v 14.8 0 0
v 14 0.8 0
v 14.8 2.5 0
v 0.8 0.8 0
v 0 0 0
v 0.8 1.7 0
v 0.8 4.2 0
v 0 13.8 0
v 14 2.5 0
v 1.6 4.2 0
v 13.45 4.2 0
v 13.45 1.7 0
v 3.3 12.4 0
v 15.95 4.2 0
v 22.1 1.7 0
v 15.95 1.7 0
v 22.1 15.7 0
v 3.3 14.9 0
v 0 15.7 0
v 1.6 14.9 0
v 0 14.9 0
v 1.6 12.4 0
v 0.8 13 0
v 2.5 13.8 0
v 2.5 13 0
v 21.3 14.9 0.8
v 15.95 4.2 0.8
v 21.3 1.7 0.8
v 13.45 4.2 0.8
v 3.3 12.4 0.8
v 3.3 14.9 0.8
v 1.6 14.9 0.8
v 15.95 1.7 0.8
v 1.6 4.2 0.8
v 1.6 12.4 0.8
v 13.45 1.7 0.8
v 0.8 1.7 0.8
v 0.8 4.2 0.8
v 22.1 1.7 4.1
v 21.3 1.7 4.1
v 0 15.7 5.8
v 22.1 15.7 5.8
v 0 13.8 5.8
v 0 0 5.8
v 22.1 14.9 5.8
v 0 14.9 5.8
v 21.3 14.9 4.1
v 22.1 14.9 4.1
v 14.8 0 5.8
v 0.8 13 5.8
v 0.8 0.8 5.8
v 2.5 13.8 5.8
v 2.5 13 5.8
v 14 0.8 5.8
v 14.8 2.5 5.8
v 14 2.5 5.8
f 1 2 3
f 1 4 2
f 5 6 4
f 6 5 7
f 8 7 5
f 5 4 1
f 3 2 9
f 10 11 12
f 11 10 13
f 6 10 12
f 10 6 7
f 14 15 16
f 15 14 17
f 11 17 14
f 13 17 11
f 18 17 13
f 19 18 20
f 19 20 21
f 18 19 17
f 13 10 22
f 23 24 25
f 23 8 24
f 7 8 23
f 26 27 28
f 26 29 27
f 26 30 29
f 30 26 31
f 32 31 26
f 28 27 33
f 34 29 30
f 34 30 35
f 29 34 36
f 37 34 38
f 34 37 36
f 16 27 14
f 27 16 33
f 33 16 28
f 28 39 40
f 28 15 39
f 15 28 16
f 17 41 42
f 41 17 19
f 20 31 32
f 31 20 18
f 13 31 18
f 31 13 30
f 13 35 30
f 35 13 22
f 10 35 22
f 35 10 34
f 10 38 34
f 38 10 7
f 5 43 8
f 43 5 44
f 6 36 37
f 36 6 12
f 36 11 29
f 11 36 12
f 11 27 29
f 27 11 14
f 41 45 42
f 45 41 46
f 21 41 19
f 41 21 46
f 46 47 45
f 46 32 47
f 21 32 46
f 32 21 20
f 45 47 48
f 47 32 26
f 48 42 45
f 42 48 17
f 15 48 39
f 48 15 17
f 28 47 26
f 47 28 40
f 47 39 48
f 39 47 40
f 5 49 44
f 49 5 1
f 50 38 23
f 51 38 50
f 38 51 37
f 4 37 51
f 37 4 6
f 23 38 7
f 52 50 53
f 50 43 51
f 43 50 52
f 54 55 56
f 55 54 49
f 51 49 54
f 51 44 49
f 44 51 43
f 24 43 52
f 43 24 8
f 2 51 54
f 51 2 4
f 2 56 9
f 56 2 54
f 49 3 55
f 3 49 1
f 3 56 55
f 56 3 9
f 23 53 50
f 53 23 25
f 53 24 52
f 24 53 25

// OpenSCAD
$fn=64;
m= .8;      // Materialdicke

l= 22.1;    // Laenge
w= 15.7;    // Breite
ls= 14.7;   // Laenge kurze Seite
ws= 14;     // Breite kurze Seite
l1= 13.8;   // Breite lange Wand
h= 5.8;     // volle Hoehe
hs= 4.1;    // kurze Hoehe
d= 2.5;

module bodenplatte()
{
    linear_extrude(height= m)
    difference()
    {
        square([l,ws]);
        translate([ls-d/2,0]) square([d,d]);
        translate([0,ws-d-m]) square([d+m,d]);
        translate([0,d]) square([2*m,ws-2]);
    }
}

module rueckwand()
{
    linear_extrude(height= m)
    square([l,h]);
}

module rechtewand()
{
    linear_extrude(height= m)
    square([ws,hs]);
}

module linkewand()
{
    linear_extrude(height= m)
    square([l1,h]);
}

module vorderwand()
{
    linear_extrude(height= m)
    square([ls,h]);
}

module kurzewand()
{
    linear_extrude(height= m)
    square([d,h]);
}

translate([0,w-ws,0]) bodenplatte();
translate([0,w,0]) rotate([90,0,0]) rueckwand();
translate([l-m,w-ws,0]) rotate([90,0,90]) rechtewand();
rotate([90,0,90]) linkewand();
translate([0,m,0]) rotate([90,0,0]) vorderwand();
translate([ws,0,0]) rotate([90,0,90]) kurzewand();
translate([0,l1,0]) rotate([90,0,0]) kurzewand();

/*
module longnotch()
{
    square([h2,m],center=true);
}

module longbracket()
{
    difference()
    {
        polygon(points=[[0,-l/2],
            [0,-l1-d/2],[-hn,-l1-d/2],[-hn,-l1+d/2],[0,-l1+d/2],
            [0,l1-d/2],[-hn,l1-d/2],[-hn,l1+d/2],[0,l1+d/2],
            [0,l/2],
            [h0,l/2],[h1,l/2-lk],[h1,-l/2+lk],[h0,-l/2]]);
        translate([h1-h2/2,-l2]) longnotch();
        translate([h1-h2/2,l2]) longnotch();
        translate([h1-h2/2,-l3]) longnotch();
        translate([h1-h2/2,l3]) longnotch();
    }
}

module crossnotch()
{
    square([m,h3],center=true);
}

module crossbeam()
{
    difference()
    {
        polygon(points=[[-w/2,0],[w/2,0],
            [w/2,h0],[w/2-wk,h1],[-w/2+wk,h1],[-w/2,h0]]);
        translate([w1,h3/2]) crossnotch();
        translate([-w1,h3/2]) crossnotch();
    }
}

module longbrackets()
{
    translate([-wk-2,0]) mirror([1,0]) longbracket();
    translate([wk+2, 0]) longbracket();
}

module crossbeams()
{
    translate([0,-2]) mirror([0,1]) crossbeam();
    translate([0,2]) crossbeam();
}

longbrackets();
translate([h1+w/2+wk+4,h1+4]) crossbeams();
translate([h1+w/2+wk+4,-h1-4]) crossbeams();

*/
